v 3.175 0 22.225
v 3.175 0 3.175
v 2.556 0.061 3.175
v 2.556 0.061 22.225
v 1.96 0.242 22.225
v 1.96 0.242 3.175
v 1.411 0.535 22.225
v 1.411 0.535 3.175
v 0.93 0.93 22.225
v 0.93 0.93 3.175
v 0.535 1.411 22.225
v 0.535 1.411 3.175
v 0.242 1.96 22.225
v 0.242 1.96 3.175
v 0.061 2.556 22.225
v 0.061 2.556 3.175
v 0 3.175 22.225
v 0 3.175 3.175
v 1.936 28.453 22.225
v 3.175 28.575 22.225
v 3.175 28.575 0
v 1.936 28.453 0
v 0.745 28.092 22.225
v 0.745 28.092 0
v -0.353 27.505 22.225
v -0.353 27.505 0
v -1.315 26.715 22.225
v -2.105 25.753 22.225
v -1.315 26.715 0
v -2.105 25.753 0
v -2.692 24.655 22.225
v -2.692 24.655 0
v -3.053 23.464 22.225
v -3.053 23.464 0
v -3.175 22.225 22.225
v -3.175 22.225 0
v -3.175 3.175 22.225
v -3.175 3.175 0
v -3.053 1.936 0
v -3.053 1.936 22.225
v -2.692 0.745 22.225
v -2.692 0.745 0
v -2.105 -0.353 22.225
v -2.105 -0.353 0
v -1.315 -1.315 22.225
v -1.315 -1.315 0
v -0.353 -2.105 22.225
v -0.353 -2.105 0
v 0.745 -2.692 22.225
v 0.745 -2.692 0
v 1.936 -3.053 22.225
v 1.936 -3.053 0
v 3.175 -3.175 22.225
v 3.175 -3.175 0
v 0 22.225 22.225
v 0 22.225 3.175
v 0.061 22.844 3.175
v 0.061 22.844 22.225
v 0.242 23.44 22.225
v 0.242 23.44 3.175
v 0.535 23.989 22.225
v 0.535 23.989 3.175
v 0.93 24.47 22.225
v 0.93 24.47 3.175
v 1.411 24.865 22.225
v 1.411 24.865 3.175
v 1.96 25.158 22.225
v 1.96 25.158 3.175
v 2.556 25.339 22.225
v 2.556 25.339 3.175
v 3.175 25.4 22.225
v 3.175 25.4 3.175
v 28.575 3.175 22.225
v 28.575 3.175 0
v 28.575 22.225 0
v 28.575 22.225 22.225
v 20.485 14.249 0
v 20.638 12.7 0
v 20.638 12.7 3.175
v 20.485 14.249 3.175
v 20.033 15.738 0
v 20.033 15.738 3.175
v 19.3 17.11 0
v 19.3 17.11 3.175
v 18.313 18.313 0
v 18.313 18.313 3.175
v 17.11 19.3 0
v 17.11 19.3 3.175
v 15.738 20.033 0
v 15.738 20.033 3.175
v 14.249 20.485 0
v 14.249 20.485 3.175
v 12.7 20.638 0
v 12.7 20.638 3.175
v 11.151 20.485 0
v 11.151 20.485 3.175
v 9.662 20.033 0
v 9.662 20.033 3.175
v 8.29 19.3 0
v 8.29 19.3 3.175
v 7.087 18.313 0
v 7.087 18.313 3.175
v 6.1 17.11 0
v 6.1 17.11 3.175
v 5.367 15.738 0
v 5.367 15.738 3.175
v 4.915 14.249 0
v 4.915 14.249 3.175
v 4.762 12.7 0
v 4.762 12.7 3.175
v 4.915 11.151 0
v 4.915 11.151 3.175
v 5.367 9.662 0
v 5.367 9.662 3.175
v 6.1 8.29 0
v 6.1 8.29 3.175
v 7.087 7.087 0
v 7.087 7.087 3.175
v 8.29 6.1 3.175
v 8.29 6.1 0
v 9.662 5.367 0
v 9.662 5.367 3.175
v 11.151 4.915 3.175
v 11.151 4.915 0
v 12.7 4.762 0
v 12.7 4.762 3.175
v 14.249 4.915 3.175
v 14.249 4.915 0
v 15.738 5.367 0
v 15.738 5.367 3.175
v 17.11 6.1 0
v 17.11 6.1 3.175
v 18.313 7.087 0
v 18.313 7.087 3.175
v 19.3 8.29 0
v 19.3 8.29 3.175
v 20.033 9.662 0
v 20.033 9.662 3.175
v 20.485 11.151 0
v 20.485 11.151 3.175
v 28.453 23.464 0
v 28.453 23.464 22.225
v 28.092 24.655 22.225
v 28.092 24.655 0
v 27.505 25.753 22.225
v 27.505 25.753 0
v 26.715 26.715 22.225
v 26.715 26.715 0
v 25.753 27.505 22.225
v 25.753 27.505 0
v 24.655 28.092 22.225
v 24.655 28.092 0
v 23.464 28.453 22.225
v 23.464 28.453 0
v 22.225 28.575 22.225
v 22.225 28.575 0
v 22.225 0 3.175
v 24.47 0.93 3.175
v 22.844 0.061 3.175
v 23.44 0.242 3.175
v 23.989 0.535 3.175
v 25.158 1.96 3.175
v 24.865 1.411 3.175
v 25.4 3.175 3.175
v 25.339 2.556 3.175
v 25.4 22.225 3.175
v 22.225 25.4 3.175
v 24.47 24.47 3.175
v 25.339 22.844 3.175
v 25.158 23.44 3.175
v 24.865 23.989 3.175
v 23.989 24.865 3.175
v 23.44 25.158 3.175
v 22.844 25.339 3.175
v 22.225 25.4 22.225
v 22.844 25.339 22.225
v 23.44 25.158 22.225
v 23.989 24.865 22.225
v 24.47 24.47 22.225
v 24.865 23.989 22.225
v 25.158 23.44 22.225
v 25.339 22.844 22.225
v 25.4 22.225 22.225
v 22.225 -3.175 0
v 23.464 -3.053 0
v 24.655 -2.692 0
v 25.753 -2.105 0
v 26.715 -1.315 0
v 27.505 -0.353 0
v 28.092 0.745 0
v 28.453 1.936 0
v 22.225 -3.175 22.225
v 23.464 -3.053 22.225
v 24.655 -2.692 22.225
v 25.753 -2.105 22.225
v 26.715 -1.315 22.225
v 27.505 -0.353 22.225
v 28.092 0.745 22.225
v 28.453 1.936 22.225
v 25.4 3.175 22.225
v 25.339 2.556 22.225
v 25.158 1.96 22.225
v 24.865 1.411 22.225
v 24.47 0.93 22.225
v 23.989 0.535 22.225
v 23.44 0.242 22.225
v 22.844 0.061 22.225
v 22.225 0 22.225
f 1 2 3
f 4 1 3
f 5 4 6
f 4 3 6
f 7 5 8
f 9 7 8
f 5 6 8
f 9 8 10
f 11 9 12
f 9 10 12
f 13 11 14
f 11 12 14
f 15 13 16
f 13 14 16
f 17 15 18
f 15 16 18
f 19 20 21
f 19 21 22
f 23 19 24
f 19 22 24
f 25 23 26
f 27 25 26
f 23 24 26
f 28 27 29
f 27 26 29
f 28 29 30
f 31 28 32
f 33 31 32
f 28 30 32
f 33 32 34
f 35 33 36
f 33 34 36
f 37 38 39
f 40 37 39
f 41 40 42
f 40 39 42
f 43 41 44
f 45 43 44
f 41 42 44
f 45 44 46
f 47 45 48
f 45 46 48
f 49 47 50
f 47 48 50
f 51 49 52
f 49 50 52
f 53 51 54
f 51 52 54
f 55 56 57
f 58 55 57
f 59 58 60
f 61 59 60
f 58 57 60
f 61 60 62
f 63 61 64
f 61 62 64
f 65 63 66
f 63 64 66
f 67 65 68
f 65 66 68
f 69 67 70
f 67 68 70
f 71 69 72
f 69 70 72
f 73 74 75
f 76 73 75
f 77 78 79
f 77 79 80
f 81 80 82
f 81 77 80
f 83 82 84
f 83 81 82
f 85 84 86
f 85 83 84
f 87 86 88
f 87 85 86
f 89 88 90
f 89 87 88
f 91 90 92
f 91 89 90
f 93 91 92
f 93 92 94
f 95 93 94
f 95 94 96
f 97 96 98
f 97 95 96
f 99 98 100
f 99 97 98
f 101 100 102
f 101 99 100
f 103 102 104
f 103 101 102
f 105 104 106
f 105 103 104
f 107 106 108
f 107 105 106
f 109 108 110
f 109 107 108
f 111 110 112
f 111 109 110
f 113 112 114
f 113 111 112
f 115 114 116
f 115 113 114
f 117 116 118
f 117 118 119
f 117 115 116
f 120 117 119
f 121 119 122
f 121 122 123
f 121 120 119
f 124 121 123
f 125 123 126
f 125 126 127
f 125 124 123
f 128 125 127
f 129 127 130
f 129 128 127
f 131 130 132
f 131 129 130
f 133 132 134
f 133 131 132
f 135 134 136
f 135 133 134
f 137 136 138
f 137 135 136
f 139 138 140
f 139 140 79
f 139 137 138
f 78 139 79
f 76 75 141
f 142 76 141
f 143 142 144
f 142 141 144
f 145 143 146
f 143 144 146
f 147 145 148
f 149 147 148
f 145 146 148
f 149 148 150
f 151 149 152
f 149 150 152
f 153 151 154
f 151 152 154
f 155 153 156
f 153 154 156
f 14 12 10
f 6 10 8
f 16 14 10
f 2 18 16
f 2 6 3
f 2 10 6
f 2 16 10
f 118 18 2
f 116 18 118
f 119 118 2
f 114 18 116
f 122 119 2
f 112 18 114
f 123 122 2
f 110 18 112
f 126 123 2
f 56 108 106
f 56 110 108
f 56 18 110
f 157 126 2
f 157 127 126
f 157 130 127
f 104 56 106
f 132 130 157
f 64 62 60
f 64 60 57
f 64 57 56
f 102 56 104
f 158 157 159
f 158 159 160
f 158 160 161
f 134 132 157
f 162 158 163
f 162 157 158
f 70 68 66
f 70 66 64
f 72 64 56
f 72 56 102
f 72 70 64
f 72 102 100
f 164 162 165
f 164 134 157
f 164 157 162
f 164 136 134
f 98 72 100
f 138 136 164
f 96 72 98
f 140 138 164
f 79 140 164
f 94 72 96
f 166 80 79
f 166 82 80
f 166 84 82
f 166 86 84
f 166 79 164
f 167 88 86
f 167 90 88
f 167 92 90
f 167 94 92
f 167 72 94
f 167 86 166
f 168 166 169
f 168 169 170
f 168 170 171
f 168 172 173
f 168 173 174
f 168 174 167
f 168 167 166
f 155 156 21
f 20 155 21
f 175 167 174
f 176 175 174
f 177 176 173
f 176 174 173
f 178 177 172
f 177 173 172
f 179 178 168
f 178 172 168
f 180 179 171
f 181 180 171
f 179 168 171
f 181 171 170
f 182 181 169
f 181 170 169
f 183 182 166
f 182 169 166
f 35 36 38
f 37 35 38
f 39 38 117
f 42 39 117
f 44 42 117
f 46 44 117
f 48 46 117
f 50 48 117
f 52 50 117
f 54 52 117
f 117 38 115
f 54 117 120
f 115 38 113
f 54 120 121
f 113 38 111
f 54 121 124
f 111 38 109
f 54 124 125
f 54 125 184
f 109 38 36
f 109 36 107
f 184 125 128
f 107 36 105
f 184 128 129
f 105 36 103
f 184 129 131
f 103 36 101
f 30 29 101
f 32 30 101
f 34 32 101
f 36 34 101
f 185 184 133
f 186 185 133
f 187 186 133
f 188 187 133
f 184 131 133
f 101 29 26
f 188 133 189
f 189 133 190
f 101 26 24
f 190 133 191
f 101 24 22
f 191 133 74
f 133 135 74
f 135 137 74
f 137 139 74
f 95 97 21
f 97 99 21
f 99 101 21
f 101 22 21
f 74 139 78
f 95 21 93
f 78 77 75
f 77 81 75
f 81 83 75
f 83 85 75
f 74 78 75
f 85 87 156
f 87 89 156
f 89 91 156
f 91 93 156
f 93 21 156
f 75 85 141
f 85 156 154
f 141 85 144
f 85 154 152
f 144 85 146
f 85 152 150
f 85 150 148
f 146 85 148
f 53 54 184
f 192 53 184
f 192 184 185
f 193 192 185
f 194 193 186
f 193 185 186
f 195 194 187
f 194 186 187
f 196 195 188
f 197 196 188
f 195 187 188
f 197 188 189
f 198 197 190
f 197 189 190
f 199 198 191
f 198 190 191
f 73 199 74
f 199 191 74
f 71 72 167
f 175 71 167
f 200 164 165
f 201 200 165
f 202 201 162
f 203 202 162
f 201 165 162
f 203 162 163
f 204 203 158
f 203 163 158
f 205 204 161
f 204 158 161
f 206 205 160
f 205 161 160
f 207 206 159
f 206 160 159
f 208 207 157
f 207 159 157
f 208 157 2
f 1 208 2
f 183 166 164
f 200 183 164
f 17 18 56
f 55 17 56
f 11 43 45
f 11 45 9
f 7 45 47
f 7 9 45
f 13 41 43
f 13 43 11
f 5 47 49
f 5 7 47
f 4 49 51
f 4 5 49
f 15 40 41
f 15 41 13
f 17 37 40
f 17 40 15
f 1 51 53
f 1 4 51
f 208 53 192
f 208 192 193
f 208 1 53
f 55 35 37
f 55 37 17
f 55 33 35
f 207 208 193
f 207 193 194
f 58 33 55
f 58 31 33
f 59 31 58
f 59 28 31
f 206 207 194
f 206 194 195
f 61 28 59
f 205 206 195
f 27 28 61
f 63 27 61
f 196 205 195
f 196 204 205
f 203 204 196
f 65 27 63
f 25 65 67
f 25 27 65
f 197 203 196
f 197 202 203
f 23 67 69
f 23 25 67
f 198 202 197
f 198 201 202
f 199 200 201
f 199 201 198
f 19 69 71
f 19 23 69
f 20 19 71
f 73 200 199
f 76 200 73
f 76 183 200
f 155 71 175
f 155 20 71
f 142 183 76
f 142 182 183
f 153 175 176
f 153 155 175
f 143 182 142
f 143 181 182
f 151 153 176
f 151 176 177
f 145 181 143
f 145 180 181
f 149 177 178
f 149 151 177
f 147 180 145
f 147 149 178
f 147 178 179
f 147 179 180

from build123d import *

# Parameters (mm, degrees)
F1_DEPTH = 22.225
F0_R     = 7.9375
F2_DEPTH = 3.175


with BuildPart() as f1:
    # F0 (on Top) → F1 (new body)
    with BuildSketch(Plane.XY):
        with BuildLine():
            Line((-3.175, 22.225), (-3.175, 12.7))
            Line((-3.175, 12.7), (-3.175, 3.175))
            ThreePointArc((-3.175, 3.175), (-1.315128, -1.315128), (3.175, -3.175))
            Line((3.175, -3.175), (12.7, -3.175))
            Line((12.7, -3.175), (22.225, -3.175))
            ThreePointArc((22.225, -3.175), (26.715128, -1.315128), (28.575, 3.175))
            Line((28.575, 3.175), (28.575, 12.7))
            Line((28.575, 12.7), (28.575, 22.225))
            ThreePointArc((28.575, 22.225), (26.715128, 26.715128), (22.225, 28.575))
            Line((22.225, 28.575), (12.7, 28.575))
            Line((12.7, 28.575), (3.175, 28.575))
            ThreePointArc((3.175, 28.575), (-1.315128, 26.715128), (-3.175, 22.225))
        make_face()
        with BuildLine():
            Line((0, 3.175), (0, 12.7))
            Line((0, 12.7), (0, 22.225))
            ThreePointArc((0, 22.225), (0.929936, 24.470064), (3.175, 25.4))
            Line((3.175, 25.4), (12.7, 25.4))
            Line((12.7, 25.4), (22.225, 25.4))
            ThreePointArc((22.225, 25.4), (24.470064, 24.470064), (25.4, 22.225))
            Line((25.4, 22.225), (25.4, 12.7))
            Line((25.4, 12.7), (25.4, 3.175))
            ThreePointArc((25.4, 3.175), (24.470064, 0.929936), (22.225, 0))
            Line((22.225, 0), (12.7, 0))
            Line((12.7, 0), (3.175, 0))
            ThreePointArc((3.175, 0), (0.929936, 0.929936), (0, 3.175))
        make_face(mode=Mode.SUBTRACT)
    extrude(amount=F1_DEPTH)

    # F0 (on Top) → F2 (join)
    with BuildSketch(Plane.XY):
        with BuildLine():
            Line((0, 22.225), (0, 12.7))
            Line((0, 12.7), (0, 3.175))
            ThreePointArc((0, 3.175), (0.929936, 0.929936), (3.175, 0))
            Line((3.175, 0), (12.7, 0))
            Line((12.7, 0), (22.225, 0))
            ThreePointArc((22.225, 0), (24.470064, 0.929936), (25.4, 3.175))
            Line((25.4, 3.175), (25.4, 12.7))
            Line((25.4, 12.7), (25.4, 22.225))
            ThreePointArc((25.4, 22.225), (24.470064, 24.470064), (22.225, 25.4))
            Line((22.225, 25.4), (12.7, 25.4))
            Line((12.7, 25.4), (3.175, 25.4))
            ThreePointArc((3.175, 25.4), (0.929936, 24.470064), (0, 22.225))
        make_face()
        with Locations((12.7, 12.7)):
            Circle(F0_R, mode=Mode.SUBTRACT)
    extrude(amount=F2_DEPTH)


solid = f1.part
